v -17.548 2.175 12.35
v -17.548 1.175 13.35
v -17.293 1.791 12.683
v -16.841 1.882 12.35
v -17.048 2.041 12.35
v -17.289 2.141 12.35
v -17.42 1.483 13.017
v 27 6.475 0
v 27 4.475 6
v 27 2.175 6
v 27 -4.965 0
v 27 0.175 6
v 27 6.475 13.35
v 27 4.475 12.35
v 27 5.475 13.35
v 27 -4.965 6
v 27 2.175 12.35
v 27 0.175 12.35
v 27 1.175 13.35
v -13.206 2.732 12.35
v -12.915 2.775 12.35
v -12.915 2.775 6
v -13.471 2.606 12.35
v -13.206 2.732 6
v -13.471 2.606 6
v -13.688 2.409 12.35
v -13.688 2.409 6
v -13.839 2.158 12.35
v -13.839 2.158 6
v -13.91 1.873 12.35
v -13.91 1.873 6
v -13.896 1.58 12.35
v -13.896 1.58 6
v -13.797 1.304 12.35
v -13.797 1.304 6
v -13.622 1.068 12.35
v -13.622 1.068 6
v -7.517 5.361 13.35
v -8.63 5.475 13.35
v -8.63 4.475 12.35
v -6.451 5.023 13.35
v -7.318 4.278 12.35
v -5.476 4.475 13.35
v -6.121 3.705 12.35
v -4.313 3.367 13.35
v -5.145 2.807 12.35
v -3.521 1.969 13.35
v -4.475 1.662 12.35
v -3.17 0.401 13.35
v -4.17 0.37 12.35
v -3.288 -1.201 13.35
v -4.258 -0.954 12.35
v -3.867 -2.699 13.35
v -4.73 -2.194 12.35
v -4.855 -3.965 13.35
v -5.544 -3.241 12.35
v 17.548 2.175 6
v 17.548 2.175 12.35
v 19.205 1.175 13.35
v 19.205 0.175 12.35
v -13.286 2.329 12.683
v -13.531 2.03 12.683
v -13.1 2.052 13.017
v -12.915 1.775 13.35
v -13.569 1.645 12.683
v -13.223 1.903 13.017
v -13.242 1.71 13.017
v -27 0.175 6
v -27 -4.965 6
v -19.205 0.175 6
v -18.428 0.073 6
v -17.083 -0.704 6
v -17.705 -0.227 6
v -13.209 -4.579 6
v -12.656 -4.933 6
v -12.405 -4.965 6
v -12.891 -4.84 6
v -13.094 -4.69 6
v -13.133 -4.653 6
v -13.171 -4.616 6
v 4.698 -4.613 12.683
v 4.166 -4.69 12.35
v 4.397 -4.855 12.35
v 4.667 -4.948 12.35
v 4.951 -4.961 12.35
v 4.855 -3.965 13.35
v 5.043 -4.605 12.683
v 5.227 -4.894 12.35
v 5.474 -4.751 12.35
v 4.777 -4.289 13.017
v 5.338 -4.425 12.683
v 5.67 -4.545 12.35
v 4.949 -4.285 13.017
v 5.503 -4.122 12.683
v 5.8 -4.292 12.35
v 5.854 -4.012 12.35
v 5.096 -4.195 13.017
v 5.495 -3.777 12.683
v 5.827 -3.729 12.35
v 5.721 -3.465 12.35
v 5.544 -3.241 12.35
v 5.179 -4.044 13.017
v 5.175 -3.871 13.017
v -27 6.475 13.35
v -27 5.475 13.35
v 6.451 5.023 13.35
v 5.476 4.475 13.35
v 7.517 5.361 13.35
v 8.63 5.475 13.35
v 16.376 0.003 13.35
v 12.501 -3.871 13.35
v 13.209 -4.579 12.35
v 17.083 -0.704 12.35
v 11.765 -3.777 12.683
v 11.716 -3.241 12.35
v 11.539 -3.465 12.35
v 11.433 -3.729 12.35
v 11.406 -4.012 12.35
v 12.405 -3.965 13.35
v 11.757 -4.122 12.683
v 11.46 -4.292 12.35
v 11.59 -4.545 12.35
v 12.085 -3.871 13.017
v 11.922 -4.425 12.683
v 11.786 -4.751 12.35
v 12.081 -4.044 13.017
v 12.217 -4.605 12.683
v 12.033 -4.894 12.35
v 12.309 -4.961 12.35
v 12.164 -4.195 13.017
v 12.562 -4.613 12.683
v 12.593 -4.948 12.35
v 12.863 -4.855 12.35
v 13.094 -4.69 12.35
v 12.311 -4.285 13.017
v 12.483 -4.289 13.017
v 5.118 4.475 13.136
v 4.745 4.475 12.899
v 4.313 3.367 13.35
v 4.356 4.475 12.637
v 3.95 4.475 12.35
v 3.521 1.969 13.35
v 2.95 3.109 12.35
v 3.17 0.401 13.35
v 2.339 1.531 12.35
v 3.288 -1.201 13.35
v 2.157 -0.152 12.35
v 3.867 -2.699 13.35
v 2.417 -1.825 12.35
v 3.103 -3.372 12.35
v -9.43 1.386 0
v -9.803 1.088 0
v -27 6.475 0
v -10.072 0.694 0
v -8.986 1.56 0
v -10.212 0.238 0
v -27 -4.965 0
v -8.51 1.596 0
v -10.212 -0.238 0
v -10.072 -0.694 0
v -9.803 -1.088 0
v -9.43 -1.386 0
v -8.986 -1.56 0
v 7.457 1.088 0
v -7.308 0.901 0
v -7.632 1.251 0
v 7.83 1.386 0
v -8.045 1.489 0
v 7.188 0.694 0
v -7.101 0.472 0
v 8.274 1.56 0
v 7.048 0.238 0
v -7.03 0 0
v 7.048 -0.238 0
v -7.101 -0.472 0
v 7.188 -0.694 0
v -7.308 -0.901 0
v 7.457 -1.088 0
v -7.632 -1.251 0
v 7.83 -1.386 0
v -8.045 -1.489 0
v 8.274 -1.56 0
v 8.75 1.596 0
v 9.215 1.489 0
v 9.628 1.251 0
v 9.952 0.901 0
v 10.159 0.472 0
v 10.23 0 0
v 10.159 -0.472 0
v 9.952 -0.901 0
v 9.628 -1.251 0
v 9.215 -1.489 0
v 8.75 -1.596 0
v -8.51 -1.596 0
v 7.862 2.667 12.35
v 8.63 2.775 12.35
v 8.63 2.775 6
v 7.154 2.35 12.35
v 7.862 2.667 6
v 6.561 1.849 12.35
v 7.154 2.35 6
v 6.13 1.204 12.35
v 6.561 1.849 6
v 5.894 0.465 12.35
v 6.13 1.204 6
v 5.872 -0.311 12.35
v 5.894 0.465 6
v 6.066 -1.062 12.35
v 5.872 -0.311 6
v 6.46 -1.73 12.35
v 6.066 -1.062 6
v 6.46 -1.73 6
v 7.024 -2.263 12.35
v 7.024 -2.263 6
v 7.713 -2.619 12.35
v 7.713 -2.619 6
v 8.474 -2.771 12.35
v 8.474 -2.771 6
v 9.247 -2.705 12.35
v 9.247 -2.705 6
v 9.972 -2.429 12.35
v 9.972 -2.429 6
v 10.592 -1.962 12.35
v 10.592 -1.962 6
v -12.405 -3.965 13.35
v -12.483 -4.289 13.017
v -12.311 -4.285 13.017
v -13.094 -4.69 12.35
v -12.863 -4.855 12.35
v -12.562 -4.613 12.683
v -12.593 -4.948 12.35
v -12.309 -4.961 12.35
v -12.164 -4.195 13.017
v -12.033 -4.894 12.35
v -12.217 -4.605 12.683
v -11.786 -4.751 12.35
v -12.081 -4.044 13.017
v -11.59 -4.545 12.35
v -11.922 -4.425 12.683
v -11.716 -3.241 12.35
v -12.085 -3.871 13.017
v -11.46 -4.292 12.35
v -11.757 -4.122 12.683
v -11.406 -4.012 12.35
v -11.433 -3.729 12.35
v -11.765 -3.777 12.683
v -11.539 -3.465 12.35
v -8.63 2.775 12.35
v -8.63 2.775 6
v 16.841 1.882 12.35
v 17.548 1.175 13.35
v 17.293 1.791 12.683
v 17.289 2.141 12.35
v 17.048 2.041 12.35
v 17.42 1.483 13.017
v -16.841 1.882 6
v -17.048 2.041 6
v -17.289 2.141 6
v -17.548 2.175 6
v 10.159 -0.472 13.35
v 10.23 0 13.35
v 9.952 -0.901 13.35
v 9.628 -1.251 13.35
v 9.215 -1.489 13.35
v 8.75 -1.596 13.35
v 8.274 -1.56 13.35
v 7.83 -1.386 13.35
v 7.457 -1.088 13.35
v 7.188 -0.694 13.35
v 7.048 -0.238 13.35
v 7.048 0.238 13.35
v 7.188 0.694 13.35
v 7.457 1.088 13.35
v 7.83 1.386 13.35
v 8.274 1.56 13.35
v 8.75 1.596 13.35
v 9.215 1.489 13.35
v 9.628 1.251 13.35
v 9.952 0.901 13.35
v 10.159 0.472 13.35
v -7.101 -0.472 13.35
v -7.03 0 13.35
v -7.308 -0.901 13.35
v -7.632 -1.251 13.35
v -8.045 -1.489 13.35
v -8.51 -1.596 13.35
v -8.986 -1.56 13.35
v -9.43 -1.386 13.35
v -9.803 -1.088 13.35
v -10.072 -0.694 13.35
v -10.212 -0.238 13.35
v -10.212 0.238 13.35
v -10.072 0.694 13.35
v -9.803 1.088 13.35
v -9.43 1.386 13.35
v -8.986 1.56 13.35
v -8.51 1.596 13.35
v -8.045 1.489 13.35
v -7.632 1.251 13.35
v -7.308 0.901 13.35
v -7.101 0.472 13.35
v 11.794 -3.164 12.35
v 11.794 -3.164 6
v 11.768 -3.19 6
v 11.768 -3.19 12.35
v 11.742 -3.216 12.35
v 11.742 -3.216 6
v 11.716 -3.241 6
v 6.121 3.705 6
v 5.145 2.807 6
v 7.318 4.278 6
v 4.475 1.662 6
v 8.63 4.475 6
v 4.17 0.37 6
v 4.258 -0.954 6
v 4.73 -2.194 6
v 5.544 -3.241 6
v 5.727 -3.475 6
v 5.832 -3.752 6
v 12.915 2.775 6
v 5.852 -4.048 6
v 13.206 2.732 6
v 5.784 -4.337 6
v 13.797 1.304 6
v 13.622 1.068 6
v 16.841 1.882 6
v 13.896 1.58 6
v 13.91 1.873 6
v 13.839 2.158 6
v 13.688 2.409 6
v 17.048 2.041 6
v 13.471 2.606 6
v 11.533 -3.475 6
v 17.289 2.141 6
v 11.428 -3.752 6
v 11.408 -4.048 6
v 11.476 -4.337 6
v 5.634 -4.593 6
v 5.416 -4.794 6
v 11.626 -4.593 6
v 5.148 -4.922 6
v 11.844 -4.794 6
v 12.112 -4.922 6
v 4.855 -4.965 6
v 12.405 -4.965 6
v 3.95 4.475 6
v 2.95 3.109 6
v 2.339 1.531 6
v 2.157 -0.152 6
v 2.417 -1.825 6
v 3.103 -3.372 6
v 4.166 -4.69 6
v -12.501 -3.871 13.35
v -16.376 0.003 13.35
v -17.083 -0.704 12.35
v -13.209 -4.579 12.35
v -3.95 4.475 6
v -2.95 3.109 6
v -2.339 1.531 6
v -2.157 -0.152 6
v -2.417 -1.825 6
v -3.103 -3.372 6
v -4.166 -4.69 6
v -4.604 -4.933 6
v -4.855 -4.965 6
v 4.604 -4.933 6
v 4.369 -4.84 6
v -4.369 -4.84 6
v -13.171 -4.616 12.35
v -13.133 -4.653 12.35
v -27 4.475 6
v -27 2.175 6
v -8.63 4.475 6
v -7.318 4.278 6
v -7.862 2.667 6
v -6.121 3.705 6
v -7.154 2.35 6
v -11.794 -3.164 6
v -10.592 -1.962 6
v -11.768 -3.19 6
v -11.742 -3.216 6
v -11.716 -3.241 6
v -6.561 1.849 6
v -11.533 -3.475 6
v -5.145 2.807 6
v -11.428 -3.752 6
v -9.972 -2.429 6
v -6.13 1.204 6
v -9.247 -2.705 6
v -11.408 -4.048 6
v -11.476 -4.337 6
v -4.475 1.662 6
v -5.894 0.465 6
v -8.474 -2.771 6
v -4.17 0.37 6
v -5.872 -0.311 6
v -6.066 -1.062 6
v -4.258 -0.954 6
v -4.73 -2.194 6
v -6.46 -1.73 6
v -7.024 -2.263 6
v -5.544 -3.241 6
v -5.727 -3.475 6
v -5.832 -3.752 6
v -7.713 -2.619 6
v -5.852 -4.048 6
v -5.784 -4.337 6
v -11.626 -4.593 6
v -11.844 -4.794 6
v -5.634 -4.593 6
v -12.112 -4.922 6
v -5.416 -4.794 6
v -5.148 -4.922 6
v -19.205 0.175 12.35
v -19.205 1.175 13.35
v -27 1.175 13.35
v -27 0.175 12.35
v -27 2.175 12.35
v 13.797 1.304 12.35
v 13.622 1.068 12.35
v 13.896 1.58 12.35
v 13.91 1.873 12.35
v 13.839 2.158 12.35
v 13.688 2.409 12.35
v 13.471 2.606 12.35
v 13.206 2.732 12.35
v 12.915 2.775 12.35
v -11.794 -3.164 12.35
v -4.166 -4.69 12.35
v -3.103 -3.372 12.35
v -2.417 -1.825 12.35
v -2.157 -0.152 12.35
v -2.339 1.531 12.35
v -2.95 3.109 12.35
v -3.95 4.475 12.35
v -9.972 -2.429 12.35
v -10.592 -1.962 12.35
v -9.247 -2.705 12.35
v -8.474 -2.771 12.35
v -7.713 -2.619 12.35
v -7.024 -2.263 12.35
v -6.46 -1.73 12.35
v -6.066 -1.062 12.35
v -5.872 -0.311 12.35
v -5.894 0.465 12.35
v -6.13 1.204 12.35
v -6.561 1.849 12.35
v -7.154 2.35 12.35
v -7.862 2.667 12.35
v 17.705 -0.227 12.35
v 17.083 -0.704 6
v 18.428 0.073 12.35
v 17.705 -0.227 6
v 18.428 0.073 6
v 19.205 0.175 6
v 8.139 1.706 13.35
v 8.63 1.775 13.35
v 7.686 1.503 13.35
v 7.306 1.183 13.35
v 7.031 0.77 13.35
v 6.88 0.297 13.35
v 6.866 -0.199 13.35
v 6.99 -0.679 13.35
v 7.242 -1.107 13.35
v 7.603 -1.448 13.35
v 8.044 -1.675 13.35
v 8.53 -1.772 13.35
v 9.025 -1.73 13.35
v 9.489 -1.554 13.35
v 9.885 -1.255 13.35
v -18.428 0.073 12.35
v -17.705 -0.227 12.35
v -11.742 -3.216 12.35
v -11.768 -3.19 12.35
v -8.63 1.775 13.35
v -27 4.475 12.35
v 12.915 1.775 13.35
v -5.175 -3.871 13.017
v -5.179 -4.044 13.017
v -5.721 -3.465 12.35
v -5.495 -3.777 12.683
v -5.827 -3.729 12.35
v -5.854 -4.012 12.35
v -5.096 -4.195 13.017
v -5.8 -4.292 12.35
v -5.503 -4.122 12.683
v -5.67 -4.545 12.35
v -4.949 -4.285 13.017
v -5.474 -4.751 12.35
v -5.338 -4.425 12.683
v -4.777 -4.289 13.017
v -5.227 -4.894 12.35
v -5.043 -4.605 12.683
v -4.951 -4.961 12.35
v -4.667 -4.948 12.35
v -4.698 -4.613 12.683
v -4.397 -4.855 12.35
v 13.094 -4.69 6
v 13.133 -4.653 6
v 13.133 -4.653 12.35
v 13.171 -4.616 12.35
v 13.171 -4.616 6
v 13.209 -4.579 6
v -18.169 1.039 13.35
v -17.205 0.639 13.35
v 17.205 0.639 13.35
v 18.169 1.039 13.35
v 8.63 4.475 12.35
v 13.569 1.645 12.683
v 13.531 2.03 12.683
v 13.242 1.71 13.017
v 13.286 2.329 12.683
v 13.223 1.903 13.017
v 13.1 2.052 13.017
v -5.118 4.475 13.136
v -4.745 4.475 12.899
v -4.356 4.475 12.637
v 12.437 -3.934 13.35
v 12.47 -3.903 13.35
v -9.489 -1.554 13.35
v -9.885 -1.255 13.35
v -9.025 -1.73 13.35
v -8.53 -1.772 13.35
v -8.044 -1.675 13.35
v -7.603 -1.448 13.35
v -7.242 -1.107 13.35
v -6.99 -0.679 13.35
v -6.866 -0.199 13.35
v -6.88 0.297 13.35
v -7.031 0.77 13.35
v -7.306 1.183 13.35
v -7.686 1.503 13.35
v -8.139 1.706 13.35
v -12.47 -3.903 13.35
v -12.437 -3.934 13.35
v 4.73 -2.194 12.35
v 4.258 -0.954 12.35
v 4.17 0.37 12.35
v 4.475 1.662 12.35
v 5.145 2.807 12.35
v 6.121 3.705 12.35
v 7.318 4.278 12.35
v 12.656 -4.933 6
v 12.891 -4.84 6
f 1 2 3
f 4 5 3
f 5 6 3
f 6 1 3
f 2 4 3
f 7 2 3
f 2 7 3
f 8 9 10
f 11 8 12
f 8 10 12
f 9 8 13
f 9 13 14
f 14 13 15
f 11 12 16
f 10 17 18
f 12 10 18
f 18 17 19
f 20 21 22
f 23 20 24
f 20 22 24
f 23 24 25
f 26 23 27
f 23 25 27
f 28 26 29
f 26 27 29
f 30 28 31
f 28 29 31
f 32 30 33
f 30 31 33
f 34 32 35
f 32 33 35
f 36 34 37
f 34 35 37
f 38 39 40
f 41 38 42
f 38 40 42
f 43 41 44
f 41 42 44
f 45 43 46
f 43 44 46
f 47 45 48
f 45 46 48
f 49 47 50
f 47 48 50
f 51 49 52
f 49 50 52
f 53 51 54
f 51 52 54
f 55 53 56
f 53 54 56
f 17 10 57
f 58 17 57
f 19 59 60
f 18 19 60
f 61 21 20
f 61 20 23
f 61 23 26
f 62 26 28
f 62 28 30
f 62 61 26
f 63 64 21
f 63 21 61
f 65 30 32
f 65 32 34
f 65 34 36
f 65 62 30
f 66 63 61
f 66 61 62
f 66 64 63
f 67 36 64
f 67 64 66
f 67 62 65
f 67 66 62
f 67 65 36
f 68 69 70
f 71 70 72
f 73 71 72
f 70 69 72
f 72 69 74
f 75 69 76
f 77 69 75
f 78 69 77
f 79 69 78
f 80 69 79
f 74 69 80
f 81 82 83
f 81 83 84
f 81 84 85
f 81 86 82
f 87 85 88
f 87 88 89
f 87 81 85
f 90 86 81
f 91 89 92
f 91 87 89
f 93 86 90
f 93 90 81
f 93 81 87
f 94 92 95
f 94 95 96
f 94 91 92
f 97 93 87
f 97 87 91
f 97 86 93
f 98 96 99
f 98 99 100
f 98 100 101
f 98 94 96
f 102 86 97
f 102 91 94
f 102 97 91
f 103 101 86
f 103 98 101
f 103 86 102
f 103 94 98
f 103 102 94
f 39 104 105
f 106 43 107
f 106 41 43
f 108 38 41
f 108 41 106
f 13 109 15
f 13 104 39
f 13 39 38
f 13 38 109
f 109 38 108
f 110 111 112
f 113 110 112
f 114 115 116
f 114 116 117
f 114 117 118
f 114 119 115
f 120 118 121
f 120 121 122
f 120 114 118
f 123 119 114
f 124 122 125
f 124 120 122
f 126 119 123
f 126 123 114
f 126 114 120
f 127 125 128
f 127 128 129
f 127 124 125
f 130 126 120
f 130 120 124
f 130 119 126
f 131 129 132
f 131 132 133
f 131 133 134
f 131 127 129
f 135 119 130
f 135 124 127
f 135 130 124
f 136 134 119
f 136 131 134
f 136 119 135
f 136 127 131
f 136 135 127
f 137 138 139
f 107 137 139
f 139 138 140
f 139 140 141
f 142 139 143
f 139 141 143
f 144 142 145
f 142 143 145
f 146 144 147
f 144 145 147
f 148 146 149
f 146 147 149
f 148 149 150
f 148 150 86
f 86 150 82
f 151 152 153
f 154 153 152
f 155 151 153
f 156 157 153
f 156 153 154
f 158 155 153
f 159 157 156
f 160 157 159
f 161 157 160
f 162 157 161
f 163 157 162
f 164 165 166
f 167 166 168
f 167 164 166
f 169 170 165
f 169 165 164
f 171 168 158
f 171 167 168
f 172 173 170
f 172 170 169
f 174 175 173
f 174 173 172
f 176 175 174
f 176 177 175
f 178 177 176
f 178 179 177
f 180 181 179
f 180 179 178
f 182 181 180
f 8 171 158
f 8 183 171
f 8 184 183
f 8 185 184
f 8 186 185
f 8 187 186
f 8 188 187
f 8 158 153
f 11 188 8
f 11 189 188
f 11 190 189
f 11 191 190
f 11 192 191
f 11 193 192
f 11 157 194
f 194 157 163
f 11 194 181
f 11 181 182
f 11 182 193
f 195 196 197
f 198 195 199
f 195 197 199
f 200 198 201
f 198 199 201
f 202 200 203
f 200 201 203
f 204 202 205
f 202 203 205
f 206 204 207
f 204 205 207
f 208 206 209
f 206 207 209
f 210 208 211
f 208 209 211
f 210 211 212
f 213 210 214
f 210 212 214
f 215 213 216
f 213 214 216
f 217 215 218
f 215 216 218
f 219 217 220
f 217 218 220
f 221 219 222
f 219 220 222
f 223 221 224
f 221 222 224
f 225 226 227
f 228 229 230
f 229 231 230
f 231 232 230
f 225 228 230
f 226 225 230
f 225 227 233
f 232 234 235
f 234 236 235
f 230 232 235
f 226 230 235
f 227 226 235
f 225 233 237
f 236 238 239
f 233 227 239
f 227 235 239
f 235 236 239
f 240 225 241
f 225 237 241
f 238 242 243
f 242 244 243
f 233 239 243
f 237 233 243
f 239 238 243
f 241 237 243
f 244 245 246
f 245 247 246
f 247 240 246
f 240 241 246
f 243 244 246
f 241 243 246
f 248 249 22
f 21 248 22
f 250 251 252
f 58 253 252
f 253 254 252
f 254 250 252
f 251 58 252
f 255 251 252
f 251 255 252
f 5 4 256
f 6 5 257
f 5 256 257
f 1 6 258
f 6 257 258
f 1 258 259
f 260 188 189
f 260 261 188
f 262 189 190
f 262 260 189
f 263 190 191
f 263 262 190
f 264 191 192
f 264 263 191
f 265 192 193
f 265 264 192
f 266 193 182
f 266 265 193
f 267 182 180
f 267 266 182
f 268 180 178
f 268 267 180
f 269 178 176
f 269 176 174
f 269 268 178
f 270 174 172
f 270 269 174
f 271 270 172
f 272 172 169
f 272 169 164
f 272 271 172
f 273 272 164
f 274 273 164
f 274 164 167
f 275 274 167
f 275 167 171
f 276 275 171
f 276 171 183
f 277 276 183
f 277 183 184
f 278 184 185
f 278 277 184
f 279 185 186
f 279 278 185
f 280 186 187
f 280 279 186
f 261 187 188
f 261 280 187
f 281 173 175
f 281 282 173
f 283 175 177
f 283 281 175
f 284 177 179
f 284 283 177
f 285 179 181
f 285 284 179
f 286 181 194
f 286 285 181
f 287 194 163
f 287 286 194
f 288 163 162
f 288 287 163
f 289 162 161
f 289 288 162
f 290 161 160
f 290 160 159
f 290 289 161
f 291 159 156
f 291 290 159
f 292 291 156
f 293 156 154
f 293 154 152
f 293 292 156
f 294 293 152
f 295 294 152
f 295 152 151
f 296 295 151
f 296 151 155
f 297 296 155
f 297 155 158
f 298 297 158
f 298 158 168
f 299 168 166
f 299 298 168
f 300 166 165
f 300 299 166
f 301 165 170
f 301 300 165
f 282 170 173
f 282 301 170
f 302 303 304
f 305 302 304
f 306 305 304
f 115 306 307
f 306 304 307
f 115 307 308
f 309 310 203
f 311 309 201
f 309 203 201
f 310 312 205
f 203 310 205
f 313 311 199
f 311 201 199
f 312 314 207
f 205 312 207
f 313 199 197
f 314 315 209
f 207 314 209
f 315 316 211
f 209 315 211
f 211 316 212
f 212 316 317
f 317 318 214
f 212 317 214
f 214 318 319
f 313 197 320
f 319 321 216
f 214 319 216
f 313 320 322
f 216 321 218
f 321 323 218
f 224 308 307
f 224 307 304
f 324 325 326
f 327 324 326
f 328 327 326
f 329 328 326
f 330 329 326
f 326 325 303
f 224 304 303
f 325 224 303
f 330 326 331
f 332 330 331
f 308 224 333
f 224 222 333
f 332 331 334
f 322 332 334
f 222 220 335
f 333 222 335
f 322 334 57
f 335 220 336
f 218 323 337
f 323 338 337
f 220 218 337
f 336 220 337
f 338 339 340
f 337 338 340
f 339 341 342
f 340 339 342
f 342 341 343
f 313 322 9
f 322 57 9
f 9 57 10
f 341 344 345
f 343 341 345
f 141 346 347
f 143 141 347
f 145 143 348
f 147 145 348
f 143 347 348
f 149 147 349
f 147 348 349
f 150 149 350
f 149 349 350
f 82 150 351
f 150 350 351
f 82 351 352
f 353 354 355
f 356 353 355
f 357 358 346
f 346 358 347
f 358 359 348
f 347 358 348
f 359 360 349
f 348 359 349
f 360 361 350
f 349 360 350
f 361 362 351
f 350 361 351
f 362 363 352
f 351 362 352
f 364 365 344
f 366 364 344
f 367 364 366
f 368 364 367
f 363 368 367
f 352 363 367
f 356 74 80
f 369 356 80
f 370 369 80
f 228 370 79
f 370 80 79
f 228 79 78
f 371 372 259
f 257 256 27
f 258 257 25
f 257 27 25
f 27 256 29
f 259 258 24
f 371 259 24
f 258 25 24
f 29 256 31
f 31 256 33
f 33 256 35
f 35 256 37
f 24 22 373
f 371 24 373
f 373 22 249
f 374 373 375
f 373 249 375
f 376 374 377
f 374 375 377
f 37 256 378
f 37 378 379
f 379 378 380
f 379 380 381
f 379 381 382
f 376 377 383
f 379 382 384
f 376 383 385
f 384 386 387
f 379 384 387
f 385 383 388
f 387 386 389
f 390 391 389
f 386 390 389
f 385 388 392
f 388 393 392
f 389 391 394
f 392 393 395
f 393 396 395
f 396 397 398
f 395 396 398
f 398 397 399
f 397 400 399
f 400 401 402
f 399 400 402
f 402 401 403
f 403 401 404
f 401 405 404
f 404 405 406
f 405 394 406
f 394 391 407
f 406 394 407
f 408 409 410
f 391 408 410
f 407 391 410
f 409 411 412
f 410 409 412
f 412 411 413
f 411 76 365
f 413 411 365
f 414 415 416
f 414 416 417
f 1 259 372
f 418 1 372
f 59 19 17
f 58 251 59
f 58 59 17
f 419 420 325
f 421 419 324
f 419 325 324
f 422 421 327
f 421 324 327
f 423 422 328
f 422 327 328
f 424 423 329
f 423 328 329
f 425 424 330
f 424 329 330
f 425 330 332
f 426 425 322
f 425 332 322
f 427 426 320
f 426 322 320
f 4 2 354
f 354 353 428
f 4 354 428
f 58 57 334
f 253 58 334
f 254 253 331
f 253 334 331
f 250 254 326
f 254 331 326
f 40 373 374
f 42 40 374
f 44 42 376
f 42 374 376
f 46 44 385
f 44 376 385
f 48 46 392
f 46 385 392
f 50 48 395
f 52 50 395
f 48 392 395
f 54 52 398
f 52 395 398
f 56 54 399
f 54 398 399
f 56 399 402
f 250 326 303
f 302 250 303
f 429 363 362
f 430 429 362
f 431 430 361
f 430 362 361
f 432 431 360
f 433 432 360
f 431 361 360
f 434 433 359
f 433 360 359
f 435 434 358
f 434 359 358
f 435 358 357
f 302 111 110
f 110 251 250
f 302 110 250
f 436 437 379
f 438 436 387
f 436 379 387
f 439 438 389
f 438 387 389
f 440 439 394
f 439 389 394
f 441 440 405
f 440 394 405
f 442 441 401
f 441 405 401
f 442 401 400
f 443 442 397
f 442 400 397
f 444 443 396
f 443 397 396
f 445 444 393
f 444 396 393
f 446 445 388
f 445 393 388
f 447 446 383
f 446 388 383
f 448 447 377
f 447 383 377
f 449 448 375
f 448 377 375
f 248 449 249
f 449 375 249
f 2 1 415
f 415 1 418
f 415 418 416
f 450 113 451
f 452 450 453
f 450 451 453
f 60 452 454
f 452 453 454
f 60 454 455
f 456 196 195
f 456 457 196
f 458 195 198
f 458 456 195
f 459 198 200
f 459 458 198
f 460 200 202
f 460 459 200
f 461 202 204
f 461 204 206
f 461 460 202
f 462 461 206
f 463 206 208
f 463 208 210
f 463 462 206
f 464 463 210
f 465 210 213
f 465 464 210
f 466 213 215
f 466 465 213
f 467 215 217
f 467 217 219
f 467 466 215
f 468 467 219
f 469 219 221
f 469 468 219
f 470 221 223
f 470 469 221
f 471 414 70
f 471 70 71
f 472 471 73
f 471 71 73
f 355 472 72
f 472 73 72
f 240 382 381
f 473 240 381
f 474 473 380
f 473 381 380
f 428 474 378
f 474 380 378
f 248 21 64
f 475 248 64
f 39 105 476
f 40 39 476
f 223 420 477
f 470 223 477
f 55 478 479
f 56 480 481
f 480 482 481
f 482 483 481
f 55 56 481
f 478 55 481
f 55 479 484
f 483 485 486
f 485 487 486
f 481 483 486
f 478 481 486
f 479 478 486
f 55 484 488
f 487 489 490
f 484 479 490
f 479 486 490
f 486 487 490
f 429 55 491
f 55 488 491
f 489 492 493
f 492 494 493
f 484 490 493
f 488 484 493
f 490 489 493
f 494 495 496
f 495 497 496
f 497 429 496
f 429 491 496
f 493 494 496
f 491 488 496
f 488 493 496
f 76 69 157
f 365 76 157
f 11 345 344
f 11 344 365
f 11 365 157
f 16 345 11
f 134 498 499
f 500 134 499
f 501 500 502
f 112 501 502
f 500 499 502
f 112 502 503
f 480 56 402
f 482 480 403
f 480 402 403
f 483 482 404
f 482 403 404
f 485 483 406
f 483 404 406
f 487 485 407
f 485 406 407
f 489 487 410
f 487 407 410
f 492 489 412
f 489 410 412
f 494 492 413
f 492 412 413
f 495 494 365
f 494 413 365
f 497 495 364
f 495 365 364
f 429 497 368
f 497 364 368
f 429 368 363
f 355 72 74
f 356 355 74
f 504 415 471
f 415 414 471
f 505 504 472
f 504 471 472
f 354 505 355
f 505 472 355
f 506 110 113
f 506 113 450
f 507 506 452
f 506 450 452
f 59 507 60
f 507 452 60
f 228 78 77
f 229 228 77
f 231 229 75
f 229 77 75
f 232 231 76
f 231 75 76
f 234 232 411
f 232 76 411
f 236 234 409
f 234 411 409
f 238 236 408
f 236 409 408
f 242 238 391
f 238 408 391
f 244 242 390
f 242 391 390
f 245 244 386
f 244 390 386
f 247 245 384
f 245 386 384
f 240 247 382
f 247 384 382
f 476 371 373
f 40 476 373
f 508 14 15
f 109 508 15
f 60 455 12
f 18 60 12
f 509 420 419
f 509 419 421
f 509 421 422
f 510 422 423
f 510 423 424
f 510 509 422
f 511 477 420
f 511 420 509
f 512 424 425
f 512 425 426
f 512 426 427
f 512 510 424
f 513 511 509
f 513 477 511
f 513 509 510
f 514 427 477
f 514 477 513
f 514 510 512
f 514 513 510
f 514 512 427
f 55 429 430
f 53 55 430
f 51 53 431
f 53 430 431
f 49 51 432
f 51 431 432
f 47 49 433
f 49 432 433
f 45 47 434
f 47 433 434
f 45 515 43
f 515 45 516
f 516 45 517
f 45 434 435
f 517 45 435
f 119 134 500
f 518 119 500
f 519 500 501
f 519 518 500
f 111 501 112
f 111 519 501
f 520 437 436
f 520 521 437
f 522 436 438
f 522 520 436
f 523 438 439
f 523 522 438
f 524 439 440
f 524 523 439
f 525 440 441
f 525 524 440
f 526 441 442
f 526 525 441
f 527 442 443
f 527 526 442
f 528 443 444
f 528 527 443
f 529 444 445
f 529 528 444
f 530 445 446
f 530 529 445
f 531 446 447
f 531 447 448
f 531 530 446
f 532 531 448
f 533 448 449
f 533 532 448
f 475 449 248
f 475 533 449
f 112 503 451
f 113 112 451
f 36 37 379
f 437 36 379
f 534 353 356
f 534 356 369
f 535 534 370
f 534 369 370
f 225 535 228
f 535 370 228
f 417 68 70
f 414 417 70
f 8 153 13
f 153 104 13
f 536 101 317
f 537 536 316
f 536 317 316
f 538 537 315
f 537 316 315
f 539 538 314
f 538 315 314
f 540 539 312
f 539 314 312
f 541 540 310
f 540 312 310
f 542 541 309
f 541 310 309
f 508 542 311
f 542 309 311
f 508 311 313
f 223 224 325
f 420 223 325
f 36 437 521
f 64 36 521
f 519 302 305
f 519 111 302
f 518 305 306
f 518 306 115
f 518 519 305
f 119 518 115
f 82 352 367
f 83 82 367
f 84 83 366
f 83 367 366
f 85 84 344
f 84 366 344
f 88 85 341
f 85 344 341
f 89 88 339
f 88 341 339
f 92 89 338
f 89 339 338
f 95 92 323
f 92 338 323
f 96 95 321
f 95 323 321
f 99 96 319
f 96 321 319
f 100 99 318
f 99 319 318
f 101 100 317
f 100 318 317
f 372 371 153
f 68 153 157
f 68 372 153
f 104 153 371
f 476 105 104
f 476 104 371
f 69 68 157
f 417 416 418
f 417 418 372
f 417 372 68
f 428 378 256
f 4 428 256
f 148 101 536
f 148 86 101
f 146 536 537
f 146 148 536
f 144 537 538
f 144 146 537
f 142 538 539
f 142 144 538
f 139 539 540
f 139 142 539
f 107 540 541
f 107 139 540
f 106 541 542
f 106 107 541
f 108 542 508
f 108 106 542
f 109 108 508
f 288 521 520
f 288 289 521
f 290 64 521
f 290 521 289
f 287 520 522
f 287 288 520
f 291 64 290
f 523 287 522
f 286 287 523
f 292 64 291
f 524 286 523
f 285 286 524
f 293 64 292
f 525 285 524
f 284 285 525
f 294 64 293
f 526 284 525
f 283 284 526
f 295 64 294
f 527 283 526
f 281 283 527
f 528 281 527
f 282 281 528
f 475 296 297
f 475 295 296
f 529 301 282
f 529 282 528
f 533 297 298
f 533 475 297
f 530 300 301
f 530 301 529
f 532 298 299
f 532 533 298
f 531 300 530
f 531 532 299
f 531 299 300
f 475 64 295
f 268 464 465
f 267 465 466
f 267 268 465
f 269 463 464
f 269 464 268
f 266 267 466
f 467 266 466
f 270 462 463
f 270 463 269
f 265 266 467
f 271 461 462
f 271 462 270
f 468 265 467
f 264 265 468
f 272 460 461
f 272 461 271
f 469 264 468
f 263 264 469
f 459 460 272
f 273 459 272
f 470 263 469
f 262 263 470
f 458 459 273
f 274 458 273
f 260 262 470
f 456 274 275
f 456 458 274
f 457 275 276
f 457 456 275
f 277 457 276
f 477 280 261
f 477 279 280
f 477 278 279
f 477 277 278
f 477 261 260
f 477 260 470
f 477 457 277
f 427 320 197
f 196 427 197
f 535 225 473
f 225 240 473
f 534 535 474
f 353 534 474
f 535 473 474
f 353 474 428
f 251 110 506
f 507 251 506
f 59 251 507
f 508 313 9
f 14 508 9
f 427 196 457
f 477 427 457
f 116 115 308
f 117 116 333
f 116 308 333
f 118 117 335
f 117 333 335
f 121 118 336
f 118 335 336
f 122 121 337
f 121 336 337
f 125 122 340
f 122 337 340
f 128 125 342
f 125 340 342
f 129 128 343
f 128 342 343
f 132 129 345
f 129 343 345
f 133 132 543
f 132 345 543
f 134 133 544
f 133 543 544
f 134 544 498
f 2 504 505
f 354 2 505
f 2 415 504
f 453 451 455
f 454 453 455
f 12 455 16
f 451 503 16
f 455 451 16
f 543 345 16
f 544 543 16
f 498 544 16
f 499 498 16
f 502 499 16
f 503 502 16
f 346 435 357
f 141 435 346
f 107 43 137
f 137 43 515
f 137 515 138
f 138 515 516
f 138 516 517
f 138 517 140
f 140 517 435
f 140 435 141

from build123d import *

# Parameters (mm, degrees)
F2_DEPTH     = 7.35
F1_R         = 1.6
F3_W         = 54
F3_H         = 11.4404760118
F3_R         = 1.6
F4_DEPTH     = 6
F5_T1_DEPTH  = 12.023863734
F5_T3_DEPTH  = 20.941682988
F5_T5_DEPTH  = 20.941682988
F5_T7_DEPTH  = 12.023863734
F5_T9_DEPTH  = 4.2852290732
F5_T11_DEPTH = 4.2852290732
F5_T13_DEPTH = 4.2852290732
F5_T15_DEPTH = 4.2852290732
F5_T17_DEPTH = 7.1367009358
F5_T19_DEPTH = 5.4798466863
F5_T21_DEPTH = 10.3670094845
F5_T23_DEPTH = 7.1367009358
F5_T25_DEPTH = 5.4798466863
F5_T27_DEPTH = 10.3670094845
F5_T30_ANGLE = 135
F5_T32_ANGLE = 225
F5_T34_ANGLE = 225
F5_T36_ANGLE = 135
F5_T38_ANGLE = 45
F5_T40_ANGLE = 1.4096380503
F5_T42_ANGLE = 180
F5_T44_ANGLE = 1.4096380503
F5_T46_ANGLE = 45
F5_T48_ANGLE = 136.4096380503
F5_T50_ANGLE = 180
F5_T54_ANGLE = 112.8938419293
F5_T57_ANGLE = 136.4096380503
F5_T59_ANGLE = 180
F5_T63_ANGLE = 112.8938419293
F5_T66_ANGLE = 45
F5_T68_ANGLE = 1.4096380503
F5_T70_ANGLE = 180
F5_T72_ANGLE = 1.4096380503
F5_T74_ANGLE = 45


# Not quite as in the source:
# - a fillet or chamfer that OpenCascade refuses, or shapes differently, is made with other operations: its cross-section is extruded or revolved along the edge and cut away or added


with BuildPart() as f2:
    # F1 (on offset) → F2 (new body)
    with BuildSketch(Plane.XY.offset(6)):
        with BuildLine():
            Line((27, 6.475), (-27, 6.475))
            Line((-27, 6.475), (-27, 4.475))
            Line((-27, 4.475), (-8.63, 4.475))
            ThreePointArc((-8.63, 4.475), (-4.474886163, 1.6615215923), (-5.5444977169, -3.2411881557))
            ThreePointArc((-5.5444977169, -3.2411881557), (-5.579287856, -4.6549737287), (-4.1655022831, -4.6897638678))
            ThreePointArc((-4.1655022831, -4.6897638678), (-2.1567850781, -0.1520314948), (-3.9502564173, 4.475))
            Line((-3.9502564173, 4.475), (3.9502564173, 4.475))
            ThreePointArc((3.9502564173, 4.475), (2.1567850781, -0.1520314948), (4.1655022831, -4.6897638678))
            ThreePointArc((4.1655022831, -4.6897638678), (5.579287856, -4.6549737287), (5.5444977169, -3.2411881557))
            ThreePointArc((5.5444977169, -3.2411881557), (4.474886163, 1.6615215923), (8.63, 4.475))
            Line((8.63, 4.475), (27, 4.475))
            Line((27, 4.475), (27, 6.475))
        make_face()
    extrude(amount=F2_DEPTH)



with BuildPart() as f2b:
    # F1 (on offset) → F2, piece 2 (new body)
    with BuildSketch(Plane.XY.offset(6)):
        with BuildLine():
            Line((-13.6223358544, 1.0678932188), (-10.5922213178, -1.9622213178))
            ThreePointArc((-10.5922213178, -1.9622213178), (-6.0662342973, -1.0619465248), (-8.63, 2.775))
            Line((-8.63, 2.775), (-12.9152290732, 2.775))
            ThreePointArc((-12.9152290732, 2.775), (-13.8391086057, 2.1576834324), (-13.6223358544, 1.0678932188))
        make_face()
        with Locations((-8.63, 0)):
            Circle(F1_R, mode=Mode.SUBTRACT)
    extrude(amount=F2_DEPTH)


with BuildPart() as f2c:
    # F1 (on offset) → F2, piece 3 (new body)
    with BuildSketch(Plane.XY.offset(6)):
        with BuildLine():
            ThreePointArc((8.63, 2.775), (6.0662342973, -1.0619465248), (10.5922213178, -1.9622213178))
            Line((10.5922213178, -1.9622213178), (13.6223358544, 1.0678932188))
            ThreePointArc((13.6223358544, 1.0678932188), (13.8391086057, 2.1576834324), (12.9152290732, 2.775))
            Line((12.9152290732, 2.775), (8.63, 2.775))
        make_face()
        with Locations((8.63, 0)):
            Circle(F1_R, mode=Mode.SUBTRACT)
    extrude(amount=F2_DEPTH)


with BuildPart() as f2d:
    # F1 (on offset) → F2, piece 4 (new body)
    with BuildSketch(Plane.XY.offset(6)):
        with BuildLine():
            Line((-17.547819254, 2.175), (-27, 2.175))
            Line((-27, 2.175), (-27, 0.175))
            Line((-27, 0.175), (-19.2046735035, 0.175))
            ThreePointArc((-19.2046735035, 0.175), (-18.0566232064, -0.0533614025), (-17.0833531599, -0.7036796564))
            Line((-17.0833531599, -0.7036796564), (-13.2085164082, -4.5785164082))
            ThreePointArc((-13.2085164082, -4.5785164082), (-13.1518491921, -4.6344907902), (-13.0944977169, -4.6897638678))
            ThreePointArc((-13.0944977169, -4.6897638678), (-11.680712144, -4.6549737287), (-11.7155022831, -3.2411881557))
            ThreePointArc((-11.7155022831, -3.2411881557), (-11.7551390169, -3.2029878434), (-11.7943028458, -3.1643028458))
            Line((-11.7943028458, -3.1643028458), (-16.8407124728, 1.8821067812))
            ThreePointArc((-16.8407124728, 1.8821067812), (-17.1651358216, 2.0988795325), (-17.547819254, 2.175))
        make_face()
    extrude(amount=F2_DEPTH)


with BuildPart() as f2e:
    # F1 (on offset) → F2, piece 5 (new body)
    with BuildSketch(Plane.XY.offset(6)):
        with BuildLine():
            ThreePointArc((13.0944977169, -4.6897638678), (13.1518491921, -4.6344907902), (13.2085164082, -4.5785164082))
            Line((13.2085164082, -4.5785164082), (17.0833531599, -0.7036796564))
            ThreePointArc((17.0833531599, -0.7036796564), (18.0566232064, -0.0533614025), (19.2046735035, 0.175))
            Line((19.2046735035, 0.175), (27, 0.175))
            Line((27, 0.175), (27, 2.175))
            Line((27, 2.175), (17.547819254, 2.175))
            ThreePointArc((17.547819254, 2.175), (17.1651358216, 2.0988795325), (16.8407124728, 1.8821067812))
            Line((16.8407124728, 1.8821067812), (11.7943028458, -3.1643028458))
            ThreePointArc((11.7943028458, -3.1643028458), (11.7551390169, -3.2029878434), (11.7155022831, -3.2411881557))
            ThreePointArc((11.7155022831, -3.2411881557), (11.680712144, -4.6549737287), (13.0944977169, -4.6897638678))
        make_face()
    extrude(amount=F2_DEPTH)


with BuildPart() as f2_1:
    add(f2.part)

    add(f2b.part)  # F4 merges F2b

    add(f2c.part)  # F4 merges F2c

    add(f2d.part)  # F4 merges F2d

    add(f2e.part)  # F4 merges F2e
    # F3 (on face) → F4 (join, through all)
    with BuildSketch(Plane(origin=(0, 0, 6), x_dir=(1, 0, 0), z_dir=(0, 0, -1))):
        with Locations((0, -0.7547619941)):
            Rectangle(F3_W, F3_H)
        with Locations((-8.63, 0)):
            Circle(F3_R, mode=Mode.SUBTRACT)
        with Locations((8.63, 0)):
            Circle(F3_R, mode=Mode.SUBTRACT)
    extrude(amount=F4_DEPTH)

    # F5: chamfer of 1 on 6 edges, made by hand

    # F5_s2 → F5_t1 (cut)
    with BuildSketch(Plane.YZ.offset(-29.571682988)):
        Polygon((2.175, 12.35), (1.175, 13.35), (2.175, 13.35), align=None)
    extrude(amount=F5_T1_DEPTH, mode=Mode.SUBTRACT)

    # F5_s4 → F5_t3 (cut)
    with BuildSketch(Plane.YZ.offset(-29.571682988)):
        Polygon((5.475, 13.35), (4.475, 12.35), (4.475, 13.35), align=None)
    extrude(amount=F5_T3_DEPTH, mode=Mode.SUBTRACT)

    # F5_s6 → F5_t5 (cut)
    with BuildSketch(Plane.YZ.offset(8.63)):
        Polygon((4.475, 12.35), (5.475, 13.35), (4.475, 13.35), align=None)
    extrude(amount=F5_T5_DEPTH, mode=Mode.SUBTRACT)

    # F5_s8 → F5_t7 (cut)
    with BuildSketch(Plane.YZ.offset(17.547819254)):
        Polygon((1.175, 13.35), (2.175, 12.35), (2.175, 13.35), align=None)
    extrude(amount=F5_T7_DEPTH, mode=Mode.SUBTRACT)

    # F5_s10 → F5_t9 (cut)
    with BuildSketch(Plane.YZ.offset(-12.9152290732)):
        Polygon((2.775, 12.35), (1.775, 13.35), (2.775, 13.35), align=None)
    extrude(amount=F5_T9_DEPTH, mode=Mode.SUBTRACT)

    # F5_s12 → F5_t11 (cut)
    with BuildSketch(Plane.YZ.offset(8.63)):
        Polygon((2.775, 12.35), (1.775, 13.35), (2.775, 13.35), align=None)
    extrude(amount=F5_T11_DEPTH, mode=Mode.SUBTRACT)

    # F5_s14 → F5_t13 (cut)
    with BuildSketch(Plane(origin=(4.315, 4.315, 0), x_dir=(0, 0, 1), z_dir=(0.7071067812, 0.7071067812, 0))):
        Polygon((12.35, 8.8773315216), (13.35, 7.8773315216), (13.35, 8.8773315216), align=None)
    extrude(amount=F5_T13_DEPTH, mode=Mode.SUBTRACT)

    # F5_s16 → F5_t15 (cut)
    with BuildSketch(Plane(origin=(-7.3451145366, 7.3451145366, 0), x_dir=(0, 0, 1), z_dir=(0.7071067812, -0.7071067812, 0))):
        Polygon((12.35, 8.8773315216), (13.35, 7.8773315216), (13.35, 8.8773315216), align=None)
    extrude(amount=F5_T15_DEPTH, mode=Mode.SUBTRACT)

    # F5_s18 → F5_t17 (cut)
    with BuildSketch(Plane(origin=(9.361409627, 9.361409627, 0), x_dir=(0, 0, 1), z_dir=(-0.7071067812, -0.7071067812, 0))):
        Polygon((13.35, -11.5773315216), (12.35, -10.5773315216), (13.35, -10.5773315216), align=None)
    extrude(amount=F5_T17_DEPTH, mode=Mode.SUBTRACT)

    # F5_s20 → F5_t19 (cut)
    with BuildSketch(Plane(origin=(4.315, 4.315, 0), x_dir=(0, 0, 1), z_dir=(0.7071067812, 0.7071067812, 0))):
        Polygon((13.35, 11.5773315216), (12.35, 12.5773315216), (13.35, 12.5773315216), align=None)
    extrude(amount=F5_T19_DEPTH, mode=Mode.SUBTRACT)

    # F5_s22 → F5_t21 (cut)
    with BuildSketch(Plane.YZ.offset(19.2046735035)):
        Polygon((1.175, 13.35), (0.175, 12.35), (0.175, 13.35), align=None)
    extrude(amount=F5_T21_DEPTH, mode=Mode.SUBTRACT)

    # F5_s24 → F5_t23 (cut)
    with BuildSketch(Plane(origin=(-4.315, 4.315, 0), x_dir=(0, 0, 1), z_dir=(-0.7071067812, 0.7071067812, 0))):
        Polygon((13.35, -11.5773315216), (12.35, -10.5773315216), (13.35, -10.5773315216), align=None)
    extrude(amount=F5_T23_DEPTH, mode=Mode.SUBTRACT)

    # F5_s26 → F5_t25 (cut)
    with BuildSketch(Plane(origin=(-8.1898367517, 8.1898367517, 0), x_dir=(0, 0, 1), z_dir=(0.7071067812, -0.7071067812, 0))):
        Polygon((13.35, 11.5773315216), (12.35, 12.5773315216), (13.35, 12.5773315216), align=None)
    extrude(amount=F5_T25_DEPTH, mode=Mode.SUBTRACT)

    # F5_s28 → F5_t27 (cut)
    with BuildSketch(Plane.YZ.offset(-29.571682988)):
        Polygon((1.175, 13.35), (0.175, 12.35), (0.175, 13.35), align=None)
    extrude(amount=F5_T27_DEPTH, mode=Mode.SUBTRACT)

    # F5_s29 → F5_t30 (revolve, cut)
    with BuildSketch(Plane(origin=(7.3451145366, 7.3451145366, 0), x_dir=(0, 0, 1), z_dir=(-0.7071067812, -0.7071067812, 0))):
        Polygon((12.35, -8.8773315216), (13.35, -7.8773315216), (13.35, -8.8773315216), align=None)
    revolve(axis=Axis((12.9152290732, 1.775, 13.35), (0, 0, 1)), revolution_arc=F5_T30_ANGLE, mode=Mode.SUBTRACT)

    # F5_s31 → F5_t32 (revolve, cut)
    with BuildSketch(Plane.YZ.offset(8.63)):
        Polygon((2.775, 12.35), (1.775, 13.35), (2.775, 13.35), align=None)
    revolve(axis=Axis((8.63, 0, 13.35), (0, 0, 1)), revolution_arc=F5_T32_ANGLE, mode=Mode.SUBTRACT)

    # F5_s33 → F5_t34 (revolve, cut)
    with BuildSketch(Plane(origin=(-4.315, 4.315, 0), x_dir=(0, 0, 1), z_dir=(-0.7071067812, 0.7071067812, 0))):
        Polygon((12.35, -8.8773315216), (13.35, -7.8773315216), (13.35, -8.8773315216), align=None)
    revolve(axis=Axis((-8.63, 0, 13.35), (0, 0, 1)), revolution_arc=F5_T34_ANGLE, mode=Mode.SUBTRACT)

    # F5_s35 → F5_t36 (revolve, cut)
    with BuildSketch(Plane.YZ.offset(-12.9152290732)):
        Polygon((2.775, 12.35), (1.775, 13.35), (2.775, 13.35), align=None)
    revolve(axis=Axis((-12.9152290732, 1.775, 13.35), (0, 0, 1)), revolution_arc=F5_T36_ANGLE, mode=Mode.SUBTRACT)

    # F5_s37 → F5_t38 (revolve, cut)
    with BuildSketch(Plane.YZ.offset(17.547819254)):
        Polygon((1.175, 13.35), (2.175, 12.35), (2.175, 13.35), align=None)
    revolve(axis=Axis((17.547819254, 1.175, 13.35), (0, 0, 1)), revolution_arc=F5_T38_ANGLE, mode=Mode.SUBTRACT)

    # F5_s39 → F5_t40 (revolve, cut)
    with BuildSketch(Plane(origin=(4.315, 4.315, 0), x_dir=(0, 0, 1), z_dir=(0.7071067812, 0.7071067812, 0))):
        Polygon((12.35, 10.5773315216), (13.35, 11.5773315216), (13.35, 10.5773315216), align=None)
    revolve(axis=Axis((8.63, 0, 13.35), (0, 0, -1)), revolution_arc=F5_T40_ANGLE, mode=Mode.SUBTRACT)

    # F5_s41 → F5_t42 (revolve, cut)
    with BuildSketch(Plane(origin=(4.5272367132, 4.3097773234, 0), x_dir=(0, 0, 1), z_dir=(0.724287856, 0.6894977169, 0))):
        Polygon((12.35, 10.4253652968), (13.35, 11.4253652968), (13.35, 10.4253652968), align=None)
    revolve(axis=Axis((12.405, -3.9654760118, 13.35), (0, 0, 1)), revolution_arc=F5_T42_ANGLE, mode=Mode.SUBTRACT)

    # F5_s43 → F5_t44 (revolve, cut)
    with BuildSketch(Plane(origin=(4.5272367132, 4.3097773234, 0), x_dir=(0, 0, 1), z_dir=(-0.724287856, -0.6894977169, 0))):
        Polygon((12.35, -12.4253652968), (13.35, -11.4253652968), (13.35, -12.4253652968), align=None)
    revolve(axis=Axis((8.63, 0, 13.35), (0, 0, 1)), revolution_arc=F5_T44_ANGLE, mode=Mode.SUBTRACT)

    # F5_s45 → F5_t46 (revolve, cut)
    with BuildSketch(Plane(origin=(8.1898367517, 8.1898367517, 0), x_dir=(0, 0, 1), z_dir=(-0.7071067812, -0.7071067812, 0))):
        Polygon((13.35, -11.5773315216), (12.35, -12.5773315216), (13.35, -12.5773315216), align=None)
    revolve(axis=Axis((19.2046735035, -2.825, 13.35), (0, 0, -1)), revolution_arc=F5_T46_ANGLE, mode=Mode.SUBTRACT)

    # F5_s47 → F5_t48 (revolve, cut)
    with BuildSketch(Plane(origin=(4.5272367132, -4.3097773234, 0), x_dir=(0, 0, 1), z_dir=(0.724287856, -0.6894977169, 0))):
        Polygon((12.35, -1.4753652968), (13.35, -0.4753652968), (13.35, -1.4753652968), align=None)
    revolve(axis=Axis((8.63, 0, 13.35), (0, 0, -1)), revolution_arc=F5_T48_ANGLE, mode=Mode.SUBTRACT)

    # F5_s49 → F5_t50 (revolve, cut)
    with BuildSketch(Plane(origin=(4.5272367132, -4.3097773234, 0), x_dir=(0, 0, 1), z_dir=(-0.724287856, 0.6894977169, 0))):
        Polygon((12.35, -0.5246347032), (13.35, 0.4753652968), (13.35, -0.5246347032), align=None)
    revolve(axis=Axis((4.855, -3.9654760118, 13.35), (0, 0, 1)), revolution_arc=F5_T50_ANGLE, mode=Mode.SUBTRACT)


with BuildPart() as f5_tool52:
    # F5_s53 → F5_t54 (revolve)
    with BuildSketch(Plane(origin=(7.256082409, 3.1574133818, 0), x_dir=(0, 0, 1), z_dir=(0.9169501067, 0.399001882, 0))):
        Polygon((13.35, -2.0316137581), (12.35, -3.0316137581), (13.35, -3.0316137581), align=None)
    revolve(axis=Axis((8.63, 0, 13.35), (0, 0, 1)), revolution_arc=F5_T54_ANGLE)

    split(bisect_by=Plane.XZ.offset(-4.475), keep=Keep.TOP)


with BuildPart() as f2_2:
    add(f2_1.part)

    # F5_t51: cut F5_tool52
    add(f5_tool52.part, mode=Mode.SUBTRACT)

    # F5_s56 → F5_t57 (revolve, cut)
    with BuildSketch(Plane.YZ.offset(-8.63)):
        Polygon((5.475, 13.35), (4.475, 12.35), (4.475, 13.35), align=None)
    revolve(axis=Axis((-8.63, 0, 13.35), (0, 0, -1)), revolution_arc=F5_T57_ANGLE, mode=Mode.SUBTRACT)

    # F5_s58 → F5_t59 (revolve, cut)
    with BuildSketch(Plane(origin=(-4.5272367132, -4.3097773234, 0), x_dir=(0, 0, 1), z_dir=(0.724287856, 0.6894977169, 0))):
        Polygon((13.35, -0.4753652968), (12.35, -1.4753652968), (13.35, -1.4753652968), align=None)
    revolve(axis=Axis((-4.855, -3.9654760118, 13.35), (0, 0, 1)), revolution_arc=F5_T59_ANGLE, mode=Mode.SUBTRACT)


with BuildPart() as f5_tool61:
    # F5_s62 → F5_t63 (revolve)
    with BuildSketch(Plane(origin=(-4.5272367132, -4.3097773234, 0), x_dir=(0, 0, 1), z_dir=(-0.724287856, -0.6894977169, 0))):
        Polygon((13.35, 0.4753652968), (12.35, -0.5246347032), (13.35, -0.5246347032), align=None)
    revolve(axis=Axis((-8.63, 0, 13.35), (0, 0, 1)), revolution_arc=F5_T63_ANGLE)

    split(bisect_by=Plane.XZ.offset(-4.475), keep=Keep.TOP)


with BuildPart() as f2_3:
    add(f2_2.part)

    # F5_t60: cut F5_tool61
    add(f5_tool61.part, mode=Mode.SUBTRACT)

    # F5_s65 → F5_t66 (revolve, cut)
    with BuildSketch(Plane(origin=(-9.361409627, 9.361409627, 0), x_dir=(0, 0, 1), z_dir=(0.7071067812, -0.7071067812, 0))):
        Polygon((13.35, 11.5773315216), (12.35, 10.5773315216), (13.35, 10.5773315216), align=None)
    revolve(axis=Axis((-17.547819254, 1.175, 13.35), (0, 0, 1)), revolution_arc=F5_T66_ANGLE, mode=Mode.SUBTRACT)

    # F5_s67 → F5_t68 (revolve, cut)
    with BuildSketch(Plane(origin=(-4.5272367132, 4.3097773234, 0), x_dir=(0, 0, 1), z_dir=(0.724287856, -0.6894977169, 0))):
        Polygon((13.35, 11.4253652968), (12.35, 10.4253652968), (13.35, 10.4253652968), align=None)
    revolve(axis=Axis((-8.63, 0, 13.35), (0, 0, -1)), revolution_arc=F5_T68_ANGLE, mode=Mode.SUBTRACT)

    # F5_s69 → F5_t70 (revolve, cut)
    with BuildSketch(Plane(origin=(-4.5272367132, 4.3097773234, 0), x_dir=(0, 0, 1), z_dir=(-0.724287856, 0.6894977169, 0))):
        Polygon((13.35, -11.4253652968), (12.35, -12.4253652968), (13.35, -12.4253652968), align=None)
    revolve(axis=Axis((-12.405, -3.9654760118, 13.35), (0, 0, 1)), revolution_arc=F5_T70_ANGLE, mode=Mode.SUBTRACT)

    # F5_s71 → F5_t72 (revolve, cut)
    with BuildSketch(Plane(origin=(-4.315, 4.315, 0), x_dir=(0, 0, 1), z_dir=(-0.7071067812, 0.7071067812, 0))):
        Polygon((13.35, -11.5773315216), (12.35, -12.5773315216), (13.35, -12.5773315216), align=None)
    revolve(axis=Axis((-8.63, 0, 13.35), (0, 0, 1)), revolution_arc=F5_T72_ANGLE, mode=Mode.SUBTRACT)

    # F5_s73 → F5_t74 (revolve, cut)
    with BuildSketch(Plane.YZ.offset(-19.2046735035)):
        Polygon((1.175, 13.35), (0.175, 12.35), (0.175, 13.35), align=None)
    revolve(axis=Axis((-19.2046735035, -2.825, 13.35), (0, 0, -1)), revolution_arc=F5_T74_ANGLE, mode=Mode.SUBTRACT)


solid = f2_3.part
